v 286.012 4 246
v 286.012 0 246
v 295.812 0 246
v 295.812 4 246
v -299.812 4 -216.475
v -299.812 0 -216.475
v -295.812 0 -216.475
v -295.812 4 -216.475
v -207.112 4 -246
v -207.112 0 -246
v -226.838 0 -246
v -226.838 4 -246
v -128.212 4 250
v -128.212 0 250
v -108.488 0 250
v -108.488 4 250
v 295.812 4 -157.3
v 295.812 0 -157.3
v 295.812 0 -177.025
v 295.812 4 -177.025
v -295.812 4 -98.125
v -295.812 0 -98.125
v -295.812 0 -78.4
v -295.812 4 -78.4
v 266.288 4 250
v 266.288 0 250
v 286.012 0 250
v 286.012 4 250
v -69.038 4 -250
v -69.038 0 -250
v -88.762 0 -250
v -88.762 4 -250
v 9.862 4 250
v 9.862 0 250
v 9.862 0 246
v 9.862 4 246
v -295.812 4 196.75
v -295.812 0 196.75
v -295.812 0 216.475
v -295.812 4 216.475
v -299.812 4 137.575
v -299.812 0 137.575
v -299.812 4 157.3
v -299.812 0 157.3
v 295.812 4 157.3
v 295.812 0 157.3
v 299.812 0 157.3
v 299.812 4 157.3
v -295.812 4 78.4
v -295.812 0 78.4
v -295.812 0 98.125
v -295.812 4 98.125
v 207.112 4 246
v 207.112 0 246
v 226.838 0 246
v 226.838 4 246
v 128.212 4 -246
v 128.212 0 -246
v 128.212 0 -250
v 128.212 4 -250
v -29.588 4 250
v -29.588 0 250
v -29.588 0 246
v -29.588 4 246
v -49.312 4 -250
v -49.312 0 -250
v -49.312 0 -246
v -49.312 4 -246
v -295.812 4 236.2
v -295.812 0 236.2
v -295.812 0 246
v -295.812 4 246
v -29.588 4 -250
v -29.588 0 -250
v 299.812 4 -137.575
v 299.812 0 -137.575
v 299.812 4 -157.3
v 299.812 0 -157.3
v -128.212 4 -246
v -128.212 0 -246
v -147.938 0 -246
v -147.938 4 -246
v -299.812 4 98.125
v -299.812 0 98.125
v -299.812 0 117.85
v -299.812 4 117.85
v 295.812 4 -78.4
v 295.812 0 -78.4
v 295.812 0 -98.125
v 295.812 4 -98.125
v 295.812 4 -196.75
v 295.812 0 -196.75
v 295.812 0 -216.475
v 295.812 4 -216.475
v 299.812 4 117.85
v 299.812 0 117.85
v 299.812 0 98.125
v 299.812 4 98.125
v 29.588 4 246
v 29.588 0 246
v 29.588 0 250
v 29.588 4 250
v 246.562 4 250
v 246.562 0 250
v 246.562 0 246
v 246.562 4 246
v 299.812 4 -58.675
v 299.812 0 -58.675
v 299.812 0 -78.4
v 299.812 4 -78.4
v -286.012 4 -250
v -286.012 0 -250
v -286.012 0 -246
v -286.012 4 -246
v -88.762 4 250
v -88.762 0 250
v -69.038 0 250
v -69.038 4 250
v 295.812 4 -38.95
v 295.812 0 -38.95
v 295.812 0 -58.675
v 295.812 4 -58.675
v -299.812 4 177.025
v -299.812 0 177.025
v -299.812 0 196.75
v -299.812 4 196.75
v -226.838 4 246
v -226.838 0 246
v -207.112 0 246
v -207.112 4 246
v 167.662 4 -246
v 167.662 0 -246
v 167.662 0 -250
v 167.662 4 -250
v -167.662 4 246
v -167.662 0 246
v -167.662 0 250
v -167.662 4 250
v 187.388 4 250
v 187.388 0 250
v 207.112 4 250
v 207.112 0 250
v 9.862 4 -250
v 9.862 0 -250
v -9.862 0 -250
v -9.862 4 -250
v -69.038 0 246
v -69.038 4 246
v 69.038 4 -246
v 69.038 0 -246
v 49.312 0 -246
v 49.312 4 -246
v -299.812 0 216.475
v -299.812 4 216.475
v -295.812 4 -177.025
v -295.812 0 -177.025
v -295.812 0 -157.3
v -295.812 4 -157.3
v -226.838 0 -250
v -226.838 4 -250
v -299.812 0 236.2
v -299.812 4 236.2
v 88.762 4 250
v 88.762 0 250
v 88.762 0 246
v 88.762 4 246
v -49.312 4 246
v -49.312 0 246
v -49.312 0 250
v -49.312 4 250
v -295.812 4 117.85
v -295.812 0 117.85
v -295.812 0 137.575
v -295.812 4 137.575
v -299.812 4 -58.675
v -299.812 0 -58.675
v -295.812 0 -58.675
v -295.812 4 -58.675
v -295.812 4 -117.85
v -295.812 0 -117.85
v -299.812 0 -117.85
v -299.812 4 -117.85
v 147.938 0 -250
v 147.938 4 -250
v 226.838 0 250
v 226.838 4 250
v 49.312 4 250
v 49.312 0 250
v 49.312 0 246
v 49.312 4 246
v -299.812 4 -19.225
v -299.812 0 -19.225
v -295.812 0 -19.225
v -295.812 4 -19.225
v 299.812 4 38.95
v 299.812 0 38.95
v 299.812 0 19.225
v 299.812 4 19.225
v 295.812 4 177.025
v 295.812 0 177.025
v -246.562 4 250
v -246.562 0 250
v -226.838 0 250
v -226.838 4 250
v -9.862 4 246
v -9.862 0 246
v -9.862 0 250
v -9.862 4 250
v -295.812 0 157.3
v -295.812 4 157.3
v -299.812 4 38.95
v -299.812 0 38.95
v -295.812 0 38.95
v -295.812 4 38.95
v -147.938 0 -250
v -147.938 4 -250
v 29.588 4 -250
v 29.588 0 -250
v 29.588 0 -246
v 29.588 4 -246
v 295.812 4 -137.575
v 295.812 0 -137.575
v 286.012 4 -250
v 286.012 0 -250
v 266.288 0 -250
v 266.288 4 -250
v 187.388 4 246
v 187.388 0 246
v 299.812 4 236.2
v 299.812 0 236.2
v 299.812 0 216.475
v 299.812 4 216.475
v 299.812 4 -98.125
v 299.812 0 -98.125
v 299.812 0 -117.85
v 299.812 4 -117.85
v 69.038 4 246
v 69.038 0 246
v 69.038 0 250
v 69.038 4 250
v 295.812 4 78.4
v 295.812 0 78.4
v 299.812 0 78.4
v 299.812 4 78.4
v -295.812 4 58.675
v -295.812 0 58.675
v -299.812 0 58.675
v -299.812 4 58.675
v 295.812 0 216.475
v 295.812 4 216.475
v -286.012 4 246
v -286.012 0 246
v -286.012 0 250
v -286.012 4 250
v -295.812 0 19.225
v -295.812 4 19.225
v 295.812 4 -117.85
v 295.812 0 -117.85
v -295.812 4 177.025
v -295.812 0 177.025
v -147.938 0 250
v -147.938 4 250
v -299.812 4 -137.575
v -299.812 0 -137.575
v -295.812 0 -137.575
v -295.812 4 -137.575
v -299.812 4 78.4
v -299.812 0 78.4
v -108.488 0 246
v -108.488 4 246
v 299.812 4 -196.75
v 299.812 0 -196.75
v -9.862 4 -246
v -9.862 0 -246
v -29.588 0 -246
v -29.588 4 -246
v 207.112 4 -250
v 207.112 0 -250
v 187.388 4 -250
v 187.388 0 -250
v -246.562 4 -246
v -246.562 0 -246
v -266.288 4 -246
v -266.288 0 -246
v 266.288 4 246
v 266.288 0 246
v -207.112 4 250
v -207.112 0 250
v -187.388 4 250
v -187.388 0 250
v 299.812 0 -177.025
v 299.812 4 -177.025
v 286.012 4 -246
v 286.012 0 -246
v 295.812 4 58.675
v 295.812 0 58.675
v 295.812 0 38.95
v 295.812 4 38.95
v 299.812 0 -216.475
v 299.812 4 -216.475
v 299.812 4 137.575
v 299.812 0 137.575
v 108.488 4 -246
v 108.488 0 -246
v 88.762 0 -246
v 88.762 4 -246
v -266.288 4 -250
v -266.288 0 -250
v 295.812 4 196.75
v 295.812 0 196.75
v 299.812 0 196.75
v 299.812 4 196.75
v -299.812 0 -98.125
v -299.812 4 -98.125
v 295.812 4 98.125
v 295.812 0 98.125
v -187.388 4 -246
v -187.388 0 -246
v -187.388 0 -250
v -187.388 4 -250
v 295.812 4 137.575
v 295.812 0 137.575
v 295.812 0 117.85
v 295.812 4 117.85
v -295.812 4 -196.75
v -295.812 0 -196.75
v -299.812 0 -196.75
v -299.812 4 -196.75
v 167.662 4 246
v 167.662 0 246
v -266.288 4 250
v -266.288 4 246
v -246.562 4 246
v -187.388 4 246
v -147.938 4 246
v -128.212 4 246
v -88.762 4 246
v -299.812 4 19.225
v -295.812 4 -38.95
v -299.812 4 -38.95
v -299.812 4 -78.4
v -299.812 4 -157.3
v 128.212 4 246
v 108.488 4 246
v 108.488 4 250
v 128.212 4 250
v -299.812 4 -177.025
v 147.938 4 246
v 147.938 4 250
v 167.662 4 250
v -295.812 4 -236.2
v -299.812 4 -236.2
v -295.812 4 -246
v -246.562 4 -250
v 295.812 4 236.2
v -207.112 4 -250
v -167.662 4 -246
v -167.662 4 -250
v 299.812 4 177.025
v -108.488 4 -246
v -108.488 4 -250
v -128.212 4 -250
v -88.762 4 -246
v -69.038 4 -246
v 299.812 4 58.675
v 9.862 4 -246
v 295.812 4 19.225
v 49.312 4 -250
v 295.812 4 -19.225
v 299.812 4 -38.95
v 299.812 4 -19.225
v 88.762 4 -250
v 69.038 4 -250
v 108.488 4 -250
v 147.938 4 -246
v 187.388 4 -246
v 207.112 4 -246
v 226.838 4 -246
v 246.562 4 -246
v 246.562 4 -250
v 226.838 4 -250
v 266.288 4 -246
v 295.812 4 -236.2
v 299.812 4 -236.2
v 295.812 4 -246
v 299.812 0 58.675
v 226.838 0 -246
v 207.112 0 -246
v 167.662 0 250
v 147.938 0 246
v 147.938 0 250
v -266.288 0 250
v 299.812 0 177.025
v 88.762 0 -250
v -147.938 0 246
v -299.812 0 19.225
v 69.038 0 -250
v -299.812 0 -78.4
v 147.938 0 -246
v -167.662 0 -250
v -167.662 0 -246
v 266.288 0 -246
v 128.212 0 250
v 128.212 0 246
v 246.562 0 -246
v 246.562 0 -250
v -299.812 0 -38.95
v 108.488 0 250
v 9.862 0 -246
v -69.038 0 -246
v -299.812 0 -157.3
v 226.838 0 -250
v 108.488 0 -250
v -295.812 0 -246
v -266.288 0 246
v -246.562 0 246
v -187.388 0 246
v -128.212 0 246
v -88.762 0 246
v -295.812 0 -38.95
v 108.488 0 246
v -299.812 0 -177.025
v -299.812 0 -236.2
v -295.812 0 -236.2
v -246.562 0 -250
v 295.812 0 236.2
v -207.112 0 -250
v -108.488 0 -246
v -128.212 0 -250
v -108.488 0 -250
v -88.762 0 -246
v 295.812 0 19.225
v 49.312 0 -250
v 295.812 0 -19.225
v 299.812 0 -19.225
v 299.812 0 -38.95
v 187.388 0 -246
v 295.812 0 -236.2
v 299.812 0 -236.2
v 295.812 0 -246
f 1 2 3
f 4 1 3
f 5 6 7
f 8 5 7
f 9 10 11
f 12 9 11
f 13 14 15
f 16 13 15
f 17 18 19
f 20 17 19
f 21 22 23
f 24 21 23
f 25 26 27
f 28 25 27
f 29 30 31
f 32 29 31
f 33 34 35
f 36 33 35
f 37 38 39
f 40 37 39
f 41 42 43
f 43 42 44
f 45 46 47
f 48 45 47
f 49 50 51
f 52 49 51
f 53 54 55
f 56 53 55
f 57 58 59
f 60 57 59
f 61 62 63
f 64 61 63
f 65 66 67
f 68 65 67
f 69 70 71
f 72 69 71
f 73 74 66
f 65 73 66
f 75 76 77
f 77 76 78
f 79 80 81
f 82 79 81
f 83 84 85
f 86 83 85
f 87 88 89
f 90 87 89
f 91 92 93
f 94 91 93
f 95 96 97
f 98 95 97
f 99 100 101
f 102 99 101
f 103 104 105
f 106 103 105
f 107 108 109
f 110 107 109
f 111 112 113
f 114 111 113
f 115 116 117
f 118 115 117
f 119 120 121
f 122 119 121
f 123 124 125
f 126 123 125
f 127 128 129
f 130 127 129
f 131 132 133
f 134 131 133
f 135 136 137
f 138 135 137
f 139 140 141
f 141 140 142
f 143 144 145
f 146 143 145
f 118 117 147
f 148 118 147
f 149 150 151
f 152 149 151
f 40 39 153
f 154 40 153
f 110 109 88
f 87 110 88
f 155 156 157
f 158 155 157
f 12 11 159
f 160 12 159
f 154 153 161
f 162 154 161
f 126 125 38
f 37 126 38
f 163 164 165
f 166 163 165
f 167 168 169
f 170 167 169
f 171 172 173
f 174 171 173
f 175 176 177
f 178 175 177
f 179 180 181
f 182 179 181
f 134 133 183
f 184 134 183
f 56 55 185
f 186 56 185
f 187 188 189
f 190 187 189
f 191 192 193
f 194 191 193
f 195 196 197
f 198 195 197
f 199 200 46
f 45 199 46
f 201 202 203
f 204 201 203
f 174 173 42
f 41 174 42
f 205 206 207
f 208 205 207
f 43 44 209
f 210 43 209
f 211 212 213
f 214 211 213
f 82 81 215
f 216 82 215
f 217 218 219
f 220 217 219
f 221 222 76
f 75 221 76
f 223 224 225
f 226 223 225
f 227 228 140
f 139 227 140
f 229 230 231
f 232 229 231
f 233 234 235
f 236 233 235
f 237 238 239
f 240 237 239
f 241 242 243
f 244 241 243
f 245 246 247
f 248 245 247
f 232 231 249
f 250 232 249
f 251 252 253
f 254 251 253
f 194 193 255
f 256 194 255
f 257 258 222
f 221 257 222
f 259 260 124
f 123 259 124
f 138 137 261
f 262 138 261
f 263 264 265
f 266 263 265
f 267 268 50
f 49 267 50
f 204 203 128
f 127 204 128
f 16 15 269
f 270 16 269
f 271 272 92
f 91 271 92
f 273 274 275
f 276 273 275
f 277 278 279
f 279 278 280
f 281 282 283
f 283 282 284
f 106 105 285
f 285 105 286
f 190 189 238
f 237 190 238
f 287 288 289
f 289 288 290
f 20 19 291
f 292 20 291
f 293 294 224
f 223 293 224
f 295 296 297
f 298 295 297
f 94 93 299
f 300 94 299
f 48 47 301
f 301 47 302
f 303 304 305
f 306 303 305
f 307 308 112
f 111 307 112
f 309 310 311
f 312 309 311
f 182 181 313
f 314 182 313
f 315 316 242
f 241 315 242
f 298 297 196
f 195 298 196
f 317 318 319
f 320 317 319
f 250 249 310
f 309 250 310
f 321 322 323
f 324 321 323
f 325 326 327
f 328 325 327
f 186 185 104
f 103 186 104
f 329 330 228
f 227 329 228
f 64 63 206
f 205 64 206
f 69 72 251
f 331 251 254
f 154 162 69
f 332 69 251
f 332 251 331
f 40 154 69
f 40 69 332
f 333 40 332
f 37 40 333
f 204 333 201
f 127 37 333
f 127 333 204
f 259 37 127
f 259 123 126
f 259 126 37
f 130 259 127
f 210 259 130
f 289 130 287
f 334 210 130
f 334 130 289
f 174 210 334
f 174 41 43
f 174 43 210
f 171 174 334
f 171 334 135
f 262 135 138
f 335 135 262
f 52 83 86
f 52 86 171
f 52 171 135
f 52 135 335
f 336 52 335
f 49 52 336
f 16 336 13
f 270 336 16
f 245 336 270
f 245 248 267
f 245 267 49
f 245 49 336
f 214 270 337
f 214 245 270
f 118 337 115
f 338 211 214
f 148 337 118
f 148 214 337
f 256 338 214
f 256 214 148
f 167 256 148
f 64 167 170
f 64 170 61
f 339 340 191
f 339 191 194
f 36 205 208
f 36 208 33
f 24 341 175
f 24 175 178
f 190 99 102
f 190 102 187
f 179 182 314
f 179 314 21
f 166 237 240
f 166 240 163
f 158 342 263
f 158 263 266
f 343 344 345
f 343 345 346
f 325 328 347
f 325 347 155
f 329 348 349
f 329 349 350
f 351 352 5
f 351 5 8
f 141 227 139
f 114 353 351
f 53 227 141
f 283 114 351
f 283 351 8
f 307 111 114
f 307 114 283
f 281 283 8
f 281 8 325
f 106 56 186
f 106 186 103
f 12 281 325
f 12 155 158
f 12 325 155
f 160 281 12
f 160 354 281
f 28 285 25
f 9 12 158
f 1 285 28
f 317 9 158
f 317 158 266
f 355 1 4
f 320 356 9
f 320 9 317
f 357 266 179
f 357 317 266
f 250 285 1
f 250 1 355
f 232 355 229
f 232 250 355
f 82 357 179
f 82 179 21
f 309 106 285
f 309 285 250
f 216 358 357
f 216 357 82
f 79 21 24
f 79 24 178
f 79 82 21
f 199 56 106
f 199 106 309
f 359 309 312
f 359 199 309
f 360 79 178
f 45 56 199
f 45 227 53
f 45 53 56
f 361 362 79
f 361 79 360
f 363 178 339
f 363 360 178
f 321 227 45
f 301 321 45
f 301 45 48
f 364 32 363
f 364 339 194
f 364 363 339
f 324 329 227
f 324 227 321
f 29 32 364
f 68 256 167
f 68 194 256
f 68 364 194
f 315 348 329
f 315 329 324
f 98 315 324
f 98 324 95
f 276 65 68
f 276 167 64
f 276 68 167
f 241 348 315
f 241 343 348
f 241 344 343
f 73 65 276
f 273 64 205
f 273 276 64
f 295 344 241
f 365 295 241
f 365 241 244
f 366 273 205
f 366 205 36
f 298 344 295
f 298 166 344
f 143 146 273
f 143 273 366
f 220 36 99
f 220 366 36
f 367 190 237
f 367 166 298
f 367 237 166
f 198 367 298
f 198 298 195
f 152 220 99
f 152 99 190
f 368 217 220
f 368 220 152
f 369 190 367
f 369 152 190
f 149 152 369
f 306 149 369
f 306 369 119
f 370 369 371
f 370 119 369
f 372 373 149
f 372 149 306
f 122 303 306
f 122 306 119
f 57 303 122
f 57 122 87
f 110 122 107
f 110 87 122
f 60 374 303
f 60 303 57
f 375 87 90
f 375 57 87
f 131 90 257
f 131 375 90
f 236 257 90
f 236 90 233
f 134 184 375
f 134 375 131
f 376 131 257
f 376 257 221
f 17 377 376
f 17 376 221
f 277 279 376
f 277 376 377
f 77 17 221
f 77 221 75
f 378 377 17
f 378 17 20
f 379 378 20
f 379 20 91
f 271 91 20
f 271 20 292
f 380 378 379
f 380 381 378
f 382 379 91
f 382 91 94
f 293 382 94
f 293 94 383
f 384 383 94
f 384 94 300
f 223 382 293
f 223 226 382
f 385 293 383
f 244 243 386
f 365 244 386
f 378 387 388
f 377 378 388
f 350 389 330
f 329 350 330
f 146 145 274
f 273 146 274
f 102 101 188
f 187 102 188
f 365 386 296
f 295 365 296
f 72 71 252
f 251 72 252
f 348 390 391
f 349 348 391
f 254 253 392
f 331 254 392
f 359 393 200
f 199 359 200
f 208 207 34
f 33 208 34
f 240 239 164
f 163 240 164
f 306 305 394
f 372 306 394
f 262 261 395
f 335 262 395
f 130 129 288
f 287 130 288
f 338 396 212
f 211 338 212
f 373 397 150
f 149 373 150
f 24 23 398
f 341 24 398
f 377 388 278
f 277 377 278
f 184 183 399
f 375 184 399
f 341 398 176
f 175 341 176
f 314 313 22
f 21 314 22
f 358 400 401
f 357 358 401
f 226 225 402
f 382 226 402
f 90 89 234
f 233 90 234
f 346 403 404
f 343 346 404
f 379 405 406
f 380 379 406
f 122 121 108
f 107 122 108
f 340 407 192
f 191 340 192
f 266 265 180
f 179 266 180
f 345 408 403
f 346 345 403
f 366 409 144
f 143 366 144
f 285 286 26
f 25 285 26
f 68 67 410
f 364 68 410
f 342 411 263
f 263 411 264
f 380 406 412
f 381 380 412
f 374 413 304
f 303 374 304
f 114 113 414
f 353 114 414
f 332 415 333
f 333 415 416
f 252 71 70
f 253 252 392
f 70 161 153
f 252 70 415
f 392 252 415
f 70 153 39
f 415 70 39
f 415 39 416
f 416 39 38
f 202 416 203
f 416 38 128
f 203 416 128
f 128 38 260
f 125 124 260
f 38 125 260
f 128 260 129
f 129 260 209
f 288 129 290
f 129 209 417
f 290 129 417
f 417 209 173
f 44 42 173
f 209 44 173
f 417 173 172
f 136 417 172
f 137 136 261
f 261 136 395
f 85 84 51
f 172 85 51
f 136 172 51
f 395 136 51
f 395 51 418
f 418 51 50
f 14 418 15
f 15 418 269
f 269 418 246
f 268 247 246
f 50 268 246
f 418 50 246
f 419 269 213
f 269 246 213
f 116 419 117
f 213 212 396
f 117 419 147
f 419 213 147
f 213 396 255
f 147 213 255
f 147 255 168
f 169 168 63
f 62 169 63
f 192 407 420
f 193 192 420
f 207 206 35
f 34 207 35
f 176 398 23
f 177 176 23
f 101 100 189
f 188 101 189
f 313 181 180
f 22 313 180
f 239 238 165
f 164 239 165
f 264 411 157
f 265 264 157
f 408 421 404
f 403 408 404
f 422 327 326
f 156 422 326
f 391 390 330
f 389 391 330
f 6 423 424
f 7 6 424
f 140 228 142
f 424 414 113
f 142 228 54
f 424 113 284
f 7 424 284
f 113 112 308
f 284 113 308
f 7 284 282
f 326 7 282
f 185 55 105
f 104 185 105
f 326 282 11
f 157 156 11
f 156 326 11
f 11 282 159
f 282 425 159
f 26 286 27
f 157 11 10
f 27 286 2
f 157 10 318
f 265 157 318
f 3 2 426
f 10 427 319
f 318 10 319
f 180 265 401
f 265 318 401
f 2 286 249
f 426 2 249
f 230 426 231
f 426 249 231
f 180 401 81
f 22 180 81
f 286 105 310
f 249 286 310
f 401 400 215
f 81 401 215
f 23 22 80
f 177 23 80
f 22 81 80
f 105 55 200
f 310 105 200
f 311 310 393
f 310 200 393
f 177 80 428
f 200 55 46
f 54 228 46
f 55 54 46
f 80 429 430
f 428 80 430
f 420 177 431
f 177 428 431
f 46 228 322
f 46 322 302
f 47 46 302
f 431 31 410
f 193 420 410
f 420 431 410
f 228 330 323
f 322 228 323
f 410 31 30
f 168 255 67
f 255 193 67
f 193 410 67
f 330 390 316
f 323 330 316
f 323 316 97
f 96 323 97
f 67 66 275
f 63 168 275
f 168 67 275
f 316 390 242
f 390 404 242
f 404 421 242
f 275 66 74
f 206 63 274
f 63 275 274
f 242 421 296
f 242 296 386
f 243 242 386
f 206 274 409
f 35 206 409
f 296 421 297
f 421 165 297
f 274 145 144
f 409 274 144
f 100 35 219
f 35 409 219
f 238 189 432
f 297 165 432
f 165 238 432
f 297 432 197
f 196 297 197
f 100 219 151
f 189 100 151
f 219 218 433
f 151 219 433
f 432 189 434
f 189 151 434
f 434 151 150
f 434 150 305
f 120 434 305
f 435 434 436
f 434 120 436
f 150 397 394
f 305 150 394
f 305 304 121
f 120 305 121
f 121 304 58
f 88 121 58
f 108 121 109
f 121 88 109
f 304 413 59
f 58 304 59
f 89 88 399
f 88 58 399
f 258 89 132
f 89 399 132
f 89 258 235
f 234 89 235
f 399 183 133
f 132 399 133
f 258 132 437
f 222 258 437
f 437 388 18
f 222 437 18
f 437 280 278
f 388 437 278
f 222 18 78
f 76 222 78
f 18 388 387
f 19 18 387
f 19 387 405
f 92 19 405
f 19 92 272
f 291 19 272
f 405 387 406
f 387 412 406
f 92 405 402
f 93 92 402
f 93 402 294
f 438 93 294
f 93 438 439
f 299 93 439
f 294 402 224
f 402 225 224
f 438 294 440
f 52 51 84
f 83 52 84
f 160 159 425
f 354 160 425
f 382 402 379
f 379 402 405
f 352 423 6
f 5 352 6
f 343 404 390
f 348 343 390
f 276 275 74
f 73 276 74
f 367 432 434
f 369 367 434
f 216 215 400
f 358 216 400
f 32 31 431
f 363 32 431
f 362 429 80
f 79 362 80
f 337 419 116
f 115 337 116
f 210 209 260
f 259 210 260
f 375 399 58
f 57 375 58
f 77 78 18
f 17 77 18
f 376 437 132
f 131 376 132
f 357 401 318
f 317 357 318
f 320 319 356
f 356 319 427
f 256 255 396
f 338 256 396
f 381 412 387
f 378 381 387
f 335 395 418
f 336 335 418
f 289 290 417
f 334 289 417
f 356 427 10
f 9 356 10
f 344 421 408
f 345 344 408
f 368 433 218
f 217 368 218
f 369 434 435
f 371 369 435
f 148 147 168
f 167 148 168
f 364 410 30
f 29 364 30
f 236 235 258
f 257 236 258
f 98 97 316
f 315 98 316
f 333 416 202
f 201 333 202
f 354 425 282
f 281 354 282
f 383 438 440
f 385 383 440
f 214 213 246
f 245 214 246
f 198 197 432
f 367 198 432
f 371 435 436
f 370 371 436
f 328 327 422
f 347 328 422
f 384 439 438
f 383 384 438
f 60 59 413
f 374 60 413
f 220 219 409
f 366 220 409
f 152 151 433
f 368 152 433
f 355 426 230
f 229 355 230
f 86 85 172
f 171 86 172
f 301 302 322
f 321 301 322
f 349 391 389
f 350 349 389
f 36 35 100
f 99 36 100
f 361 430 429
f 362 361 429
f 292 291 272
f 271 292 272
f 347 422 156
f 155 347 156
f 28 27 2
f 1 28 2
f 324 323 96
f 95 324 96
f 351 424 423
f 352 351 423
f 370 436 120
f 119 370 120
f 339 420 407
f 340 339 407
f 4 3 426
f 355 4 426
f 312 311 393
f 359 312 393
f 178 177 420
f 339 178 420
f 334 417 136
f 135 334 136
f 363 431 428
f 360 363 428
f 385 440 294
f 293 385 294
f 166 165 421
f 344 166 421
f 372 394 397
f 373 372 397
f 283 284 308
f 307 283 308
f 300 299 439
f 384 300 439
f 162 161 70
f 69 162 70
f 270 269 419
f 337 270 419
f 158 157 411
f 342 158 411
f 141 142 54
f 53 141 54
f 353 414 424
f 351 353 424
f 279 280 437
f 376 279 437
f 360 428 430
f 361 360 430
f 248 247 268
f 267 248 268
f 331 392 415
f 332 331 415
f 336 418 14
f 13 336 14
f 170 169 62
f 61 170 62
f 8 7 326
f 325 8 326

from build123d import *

# Parameters (mm, degrees)
BOSS_EXTRUDE1_DEPTH = 4


with BuildPart() as part:
    # Sketch1 → Boss-Extrude1 (new body)
    with BuildSketch(Plane(origin=(0, 0, 0), x_dir=(1, 0, 0), z_dir=(0, 1, 0))):
        Polygon((9.8625, 250), (-9.8625, 250), (-9.8625, 246), (-29.5875, 246), (-29.5875, 250), (-49.3125, 250), (-49.3125, 246), (-69.0375, 246), (-69.0375, 250), (-88.7625, 250), (-88.7625, 246), (-108.4875, 246), (-108.4875, 250), (-128.2125, 250), (-128.2125, 246), (-147.9375, 246), (-147.9375, 250), (-167.6625, 250), (-167.6625, 246), (-187.3875, 246), (-187.3875, 250), (-207.1125, 250), (-207.1125, 246), (-226.8375, 246), (-226.8375, 250), (-246.5625, 250), (-246.5625, 246), (-266.2875, 246), (-266.2875, 250), (-286.0125, 250), (-286.0125, 246), (-295.8125, 246), (-295.8125, 236.2), (-299.8125, 236.2), (-299.8125, 216.475), (-295.8125, 216.475), (-295.8125, 196.75), (-299.8125, 196.75), (-299.8125, 177.025), (-295.8125, 177.025), (-295.8125, 157.3), (-299.8125, 157.3), (-299.8125, 137.575), (-295.8125, 137.575), (-295.8125, 117.85), (-299.8125, 117.85), (-299.8125, 98.125), (-295.8125, 98.125), (-295.8125, 78.4), (-299.8125, 78.4), (-299.8125, 58.675), (-295.8125, 58.675), (-295.8125, 38.95), (-299.8125, 38.95), (-299.8125, 19.225), (-295.8125, 19.225), (-295.8125, -19.225), (-299.8125, -19.225), (-299.8125, -38.95), (-295.8125, -38.95), (-295.8125, -58.675), (-299.8125, -58.675), (-299.8125, -78.4), (-295.8125, -78.4), (-295.8125, -98.125), (-299.8125, -98.125), (-299.8125, -117.85), (-295.8125, -117.85), (-295.8125, -137.575), (-299.8125, -137.575), (-299.8125, -157.3), (-295.8125, -157.3), (-295.8125, -177.025), (-299.8125, -177.025), (-299.8125, -196.75), (-295.8125, -196.75), (-295.8125, -216.475), (-299.8125, -216.475), (-299.8125, -236.2), (-295.8125, -236.2), (-295.8125, -246), (-286.0125, -246), (-286.0125, -250), (-266.2875, -250), (-266.2875, -246), (-246.5625, -246), (-246.5625, -250), (-226.8375, -250), (-226.8375, -246), (-207.1125, -246), (-207.1125, -250), (-187.3875, -250), (-187.3875, -246), (-167.6625, -246), (-167.6625, -250), (-147.9375, -250), (-147.9375, -246), (-128.2125, -246), (-128.2125, -250), (-108.4875, -250), (-108.4875, -246), (-88.7625, -246), (-88.7625, -250), (-69.0375, -250), (-69.0375, -246), (-49.3125, -246), (-49.3125, -250), (-29.5875, -250), (-29.5875, -246), (-9.8625, -246), (-9.8625, -250), (9.8625, -250), (9.8625, -246), (29.5875, -246), (29.5875, -250), (49.3125, -250), (49.3125, -246), (69.0375, -246), (69.0375, -250), (88.7625, -250), (88.7625, -246), (108.4875, -246), (108.4875, -250), (128.2125, -250), (128.2125, -246), (147.9375, -246), (147.9375, -250), (167.6625, -250), (167.6625, -246), (187.3875, -246), (187.3875, -250), (207.1125, -250), (207.1125, -246), (226.8375, -246), (226.8375, -250), (246.5625, -250), (246.5625, -246), (266.2875, -246), (266.2875, -250), (286.0125, -250), (286.0125, -246), (295.8125, -246), (295.8125, -236.2), (299.8125, -236.2), (299.8125, -216.475), (295.8125, -216.475), (295.8125, -196.75), (299.8125, -196.75), (299.8125, -177.025), (295.8125, -177.025), (295.8125, -157.3), (299.8125, -157.3), (299.8125, -137.575), (295.8125, -137.575), (295.8125, -117.85), (299.8125, -117.85), (299.8125, -98.125), (295.8125, -98.125), (295.8125, -78.4), (299.8125, -78.4), (299.8125, -58.675), (295.8125, -58.675), (295.8125, -38.95), (299.8125, -38.95), (299.8125, -19.225), (295.8125, -19.225), (295.8125, 19.225), (299.8125, 19.225), (299.8125, 38.95), (295.8125, 38.95), (295.8125, 58.675), (299.8125, 58.675), (299.8125, 78.4), (295.8125, 78.4), (295.8125, 98.125), (299.8125, 98.125), (299.8125, 117.85), (295.8125, 117.85), (295.8125, 137.575), (299.8125, 137.575), (299.8125, 157.3), (295.8125, 157.3), (295.8125, 177.025), (299.8125, 177.025), (299.8125, 196.75), (295.8125, 196.75), (295.8125, 216.475), (299.8125, 216.475), (299.8125, 236.2), (295.8125, 236.2), (295.8125, 246), (286.0125, 246), (286.0125, 250), (266.2875, 250), (266.2875, 246), (246.5625, 246), (246.5625, 250), (226.8375, 250), (226.8375, 246), (207.1125, 246), (207.1125, 250), (187.3875, 250), (187.3875, 246), (167.6625, 246), (167.6625, 250), (147.9375, 250), (147.9375, 246), (128.2125, 246), (128.2125, 250), (108.4875, 250), (108.4875, 246), (88.7625, 246), (88.7625, 250), (69.0375, 250), (69.0375, 246), (49.3125, 246), (49.3125, 250), (29.5875, 250), (29.5875, 246), (9.8625, 246), align=None)
    extrude(amount=BOSS_EXTRUDE1_DEPTH)


solid = part.part
